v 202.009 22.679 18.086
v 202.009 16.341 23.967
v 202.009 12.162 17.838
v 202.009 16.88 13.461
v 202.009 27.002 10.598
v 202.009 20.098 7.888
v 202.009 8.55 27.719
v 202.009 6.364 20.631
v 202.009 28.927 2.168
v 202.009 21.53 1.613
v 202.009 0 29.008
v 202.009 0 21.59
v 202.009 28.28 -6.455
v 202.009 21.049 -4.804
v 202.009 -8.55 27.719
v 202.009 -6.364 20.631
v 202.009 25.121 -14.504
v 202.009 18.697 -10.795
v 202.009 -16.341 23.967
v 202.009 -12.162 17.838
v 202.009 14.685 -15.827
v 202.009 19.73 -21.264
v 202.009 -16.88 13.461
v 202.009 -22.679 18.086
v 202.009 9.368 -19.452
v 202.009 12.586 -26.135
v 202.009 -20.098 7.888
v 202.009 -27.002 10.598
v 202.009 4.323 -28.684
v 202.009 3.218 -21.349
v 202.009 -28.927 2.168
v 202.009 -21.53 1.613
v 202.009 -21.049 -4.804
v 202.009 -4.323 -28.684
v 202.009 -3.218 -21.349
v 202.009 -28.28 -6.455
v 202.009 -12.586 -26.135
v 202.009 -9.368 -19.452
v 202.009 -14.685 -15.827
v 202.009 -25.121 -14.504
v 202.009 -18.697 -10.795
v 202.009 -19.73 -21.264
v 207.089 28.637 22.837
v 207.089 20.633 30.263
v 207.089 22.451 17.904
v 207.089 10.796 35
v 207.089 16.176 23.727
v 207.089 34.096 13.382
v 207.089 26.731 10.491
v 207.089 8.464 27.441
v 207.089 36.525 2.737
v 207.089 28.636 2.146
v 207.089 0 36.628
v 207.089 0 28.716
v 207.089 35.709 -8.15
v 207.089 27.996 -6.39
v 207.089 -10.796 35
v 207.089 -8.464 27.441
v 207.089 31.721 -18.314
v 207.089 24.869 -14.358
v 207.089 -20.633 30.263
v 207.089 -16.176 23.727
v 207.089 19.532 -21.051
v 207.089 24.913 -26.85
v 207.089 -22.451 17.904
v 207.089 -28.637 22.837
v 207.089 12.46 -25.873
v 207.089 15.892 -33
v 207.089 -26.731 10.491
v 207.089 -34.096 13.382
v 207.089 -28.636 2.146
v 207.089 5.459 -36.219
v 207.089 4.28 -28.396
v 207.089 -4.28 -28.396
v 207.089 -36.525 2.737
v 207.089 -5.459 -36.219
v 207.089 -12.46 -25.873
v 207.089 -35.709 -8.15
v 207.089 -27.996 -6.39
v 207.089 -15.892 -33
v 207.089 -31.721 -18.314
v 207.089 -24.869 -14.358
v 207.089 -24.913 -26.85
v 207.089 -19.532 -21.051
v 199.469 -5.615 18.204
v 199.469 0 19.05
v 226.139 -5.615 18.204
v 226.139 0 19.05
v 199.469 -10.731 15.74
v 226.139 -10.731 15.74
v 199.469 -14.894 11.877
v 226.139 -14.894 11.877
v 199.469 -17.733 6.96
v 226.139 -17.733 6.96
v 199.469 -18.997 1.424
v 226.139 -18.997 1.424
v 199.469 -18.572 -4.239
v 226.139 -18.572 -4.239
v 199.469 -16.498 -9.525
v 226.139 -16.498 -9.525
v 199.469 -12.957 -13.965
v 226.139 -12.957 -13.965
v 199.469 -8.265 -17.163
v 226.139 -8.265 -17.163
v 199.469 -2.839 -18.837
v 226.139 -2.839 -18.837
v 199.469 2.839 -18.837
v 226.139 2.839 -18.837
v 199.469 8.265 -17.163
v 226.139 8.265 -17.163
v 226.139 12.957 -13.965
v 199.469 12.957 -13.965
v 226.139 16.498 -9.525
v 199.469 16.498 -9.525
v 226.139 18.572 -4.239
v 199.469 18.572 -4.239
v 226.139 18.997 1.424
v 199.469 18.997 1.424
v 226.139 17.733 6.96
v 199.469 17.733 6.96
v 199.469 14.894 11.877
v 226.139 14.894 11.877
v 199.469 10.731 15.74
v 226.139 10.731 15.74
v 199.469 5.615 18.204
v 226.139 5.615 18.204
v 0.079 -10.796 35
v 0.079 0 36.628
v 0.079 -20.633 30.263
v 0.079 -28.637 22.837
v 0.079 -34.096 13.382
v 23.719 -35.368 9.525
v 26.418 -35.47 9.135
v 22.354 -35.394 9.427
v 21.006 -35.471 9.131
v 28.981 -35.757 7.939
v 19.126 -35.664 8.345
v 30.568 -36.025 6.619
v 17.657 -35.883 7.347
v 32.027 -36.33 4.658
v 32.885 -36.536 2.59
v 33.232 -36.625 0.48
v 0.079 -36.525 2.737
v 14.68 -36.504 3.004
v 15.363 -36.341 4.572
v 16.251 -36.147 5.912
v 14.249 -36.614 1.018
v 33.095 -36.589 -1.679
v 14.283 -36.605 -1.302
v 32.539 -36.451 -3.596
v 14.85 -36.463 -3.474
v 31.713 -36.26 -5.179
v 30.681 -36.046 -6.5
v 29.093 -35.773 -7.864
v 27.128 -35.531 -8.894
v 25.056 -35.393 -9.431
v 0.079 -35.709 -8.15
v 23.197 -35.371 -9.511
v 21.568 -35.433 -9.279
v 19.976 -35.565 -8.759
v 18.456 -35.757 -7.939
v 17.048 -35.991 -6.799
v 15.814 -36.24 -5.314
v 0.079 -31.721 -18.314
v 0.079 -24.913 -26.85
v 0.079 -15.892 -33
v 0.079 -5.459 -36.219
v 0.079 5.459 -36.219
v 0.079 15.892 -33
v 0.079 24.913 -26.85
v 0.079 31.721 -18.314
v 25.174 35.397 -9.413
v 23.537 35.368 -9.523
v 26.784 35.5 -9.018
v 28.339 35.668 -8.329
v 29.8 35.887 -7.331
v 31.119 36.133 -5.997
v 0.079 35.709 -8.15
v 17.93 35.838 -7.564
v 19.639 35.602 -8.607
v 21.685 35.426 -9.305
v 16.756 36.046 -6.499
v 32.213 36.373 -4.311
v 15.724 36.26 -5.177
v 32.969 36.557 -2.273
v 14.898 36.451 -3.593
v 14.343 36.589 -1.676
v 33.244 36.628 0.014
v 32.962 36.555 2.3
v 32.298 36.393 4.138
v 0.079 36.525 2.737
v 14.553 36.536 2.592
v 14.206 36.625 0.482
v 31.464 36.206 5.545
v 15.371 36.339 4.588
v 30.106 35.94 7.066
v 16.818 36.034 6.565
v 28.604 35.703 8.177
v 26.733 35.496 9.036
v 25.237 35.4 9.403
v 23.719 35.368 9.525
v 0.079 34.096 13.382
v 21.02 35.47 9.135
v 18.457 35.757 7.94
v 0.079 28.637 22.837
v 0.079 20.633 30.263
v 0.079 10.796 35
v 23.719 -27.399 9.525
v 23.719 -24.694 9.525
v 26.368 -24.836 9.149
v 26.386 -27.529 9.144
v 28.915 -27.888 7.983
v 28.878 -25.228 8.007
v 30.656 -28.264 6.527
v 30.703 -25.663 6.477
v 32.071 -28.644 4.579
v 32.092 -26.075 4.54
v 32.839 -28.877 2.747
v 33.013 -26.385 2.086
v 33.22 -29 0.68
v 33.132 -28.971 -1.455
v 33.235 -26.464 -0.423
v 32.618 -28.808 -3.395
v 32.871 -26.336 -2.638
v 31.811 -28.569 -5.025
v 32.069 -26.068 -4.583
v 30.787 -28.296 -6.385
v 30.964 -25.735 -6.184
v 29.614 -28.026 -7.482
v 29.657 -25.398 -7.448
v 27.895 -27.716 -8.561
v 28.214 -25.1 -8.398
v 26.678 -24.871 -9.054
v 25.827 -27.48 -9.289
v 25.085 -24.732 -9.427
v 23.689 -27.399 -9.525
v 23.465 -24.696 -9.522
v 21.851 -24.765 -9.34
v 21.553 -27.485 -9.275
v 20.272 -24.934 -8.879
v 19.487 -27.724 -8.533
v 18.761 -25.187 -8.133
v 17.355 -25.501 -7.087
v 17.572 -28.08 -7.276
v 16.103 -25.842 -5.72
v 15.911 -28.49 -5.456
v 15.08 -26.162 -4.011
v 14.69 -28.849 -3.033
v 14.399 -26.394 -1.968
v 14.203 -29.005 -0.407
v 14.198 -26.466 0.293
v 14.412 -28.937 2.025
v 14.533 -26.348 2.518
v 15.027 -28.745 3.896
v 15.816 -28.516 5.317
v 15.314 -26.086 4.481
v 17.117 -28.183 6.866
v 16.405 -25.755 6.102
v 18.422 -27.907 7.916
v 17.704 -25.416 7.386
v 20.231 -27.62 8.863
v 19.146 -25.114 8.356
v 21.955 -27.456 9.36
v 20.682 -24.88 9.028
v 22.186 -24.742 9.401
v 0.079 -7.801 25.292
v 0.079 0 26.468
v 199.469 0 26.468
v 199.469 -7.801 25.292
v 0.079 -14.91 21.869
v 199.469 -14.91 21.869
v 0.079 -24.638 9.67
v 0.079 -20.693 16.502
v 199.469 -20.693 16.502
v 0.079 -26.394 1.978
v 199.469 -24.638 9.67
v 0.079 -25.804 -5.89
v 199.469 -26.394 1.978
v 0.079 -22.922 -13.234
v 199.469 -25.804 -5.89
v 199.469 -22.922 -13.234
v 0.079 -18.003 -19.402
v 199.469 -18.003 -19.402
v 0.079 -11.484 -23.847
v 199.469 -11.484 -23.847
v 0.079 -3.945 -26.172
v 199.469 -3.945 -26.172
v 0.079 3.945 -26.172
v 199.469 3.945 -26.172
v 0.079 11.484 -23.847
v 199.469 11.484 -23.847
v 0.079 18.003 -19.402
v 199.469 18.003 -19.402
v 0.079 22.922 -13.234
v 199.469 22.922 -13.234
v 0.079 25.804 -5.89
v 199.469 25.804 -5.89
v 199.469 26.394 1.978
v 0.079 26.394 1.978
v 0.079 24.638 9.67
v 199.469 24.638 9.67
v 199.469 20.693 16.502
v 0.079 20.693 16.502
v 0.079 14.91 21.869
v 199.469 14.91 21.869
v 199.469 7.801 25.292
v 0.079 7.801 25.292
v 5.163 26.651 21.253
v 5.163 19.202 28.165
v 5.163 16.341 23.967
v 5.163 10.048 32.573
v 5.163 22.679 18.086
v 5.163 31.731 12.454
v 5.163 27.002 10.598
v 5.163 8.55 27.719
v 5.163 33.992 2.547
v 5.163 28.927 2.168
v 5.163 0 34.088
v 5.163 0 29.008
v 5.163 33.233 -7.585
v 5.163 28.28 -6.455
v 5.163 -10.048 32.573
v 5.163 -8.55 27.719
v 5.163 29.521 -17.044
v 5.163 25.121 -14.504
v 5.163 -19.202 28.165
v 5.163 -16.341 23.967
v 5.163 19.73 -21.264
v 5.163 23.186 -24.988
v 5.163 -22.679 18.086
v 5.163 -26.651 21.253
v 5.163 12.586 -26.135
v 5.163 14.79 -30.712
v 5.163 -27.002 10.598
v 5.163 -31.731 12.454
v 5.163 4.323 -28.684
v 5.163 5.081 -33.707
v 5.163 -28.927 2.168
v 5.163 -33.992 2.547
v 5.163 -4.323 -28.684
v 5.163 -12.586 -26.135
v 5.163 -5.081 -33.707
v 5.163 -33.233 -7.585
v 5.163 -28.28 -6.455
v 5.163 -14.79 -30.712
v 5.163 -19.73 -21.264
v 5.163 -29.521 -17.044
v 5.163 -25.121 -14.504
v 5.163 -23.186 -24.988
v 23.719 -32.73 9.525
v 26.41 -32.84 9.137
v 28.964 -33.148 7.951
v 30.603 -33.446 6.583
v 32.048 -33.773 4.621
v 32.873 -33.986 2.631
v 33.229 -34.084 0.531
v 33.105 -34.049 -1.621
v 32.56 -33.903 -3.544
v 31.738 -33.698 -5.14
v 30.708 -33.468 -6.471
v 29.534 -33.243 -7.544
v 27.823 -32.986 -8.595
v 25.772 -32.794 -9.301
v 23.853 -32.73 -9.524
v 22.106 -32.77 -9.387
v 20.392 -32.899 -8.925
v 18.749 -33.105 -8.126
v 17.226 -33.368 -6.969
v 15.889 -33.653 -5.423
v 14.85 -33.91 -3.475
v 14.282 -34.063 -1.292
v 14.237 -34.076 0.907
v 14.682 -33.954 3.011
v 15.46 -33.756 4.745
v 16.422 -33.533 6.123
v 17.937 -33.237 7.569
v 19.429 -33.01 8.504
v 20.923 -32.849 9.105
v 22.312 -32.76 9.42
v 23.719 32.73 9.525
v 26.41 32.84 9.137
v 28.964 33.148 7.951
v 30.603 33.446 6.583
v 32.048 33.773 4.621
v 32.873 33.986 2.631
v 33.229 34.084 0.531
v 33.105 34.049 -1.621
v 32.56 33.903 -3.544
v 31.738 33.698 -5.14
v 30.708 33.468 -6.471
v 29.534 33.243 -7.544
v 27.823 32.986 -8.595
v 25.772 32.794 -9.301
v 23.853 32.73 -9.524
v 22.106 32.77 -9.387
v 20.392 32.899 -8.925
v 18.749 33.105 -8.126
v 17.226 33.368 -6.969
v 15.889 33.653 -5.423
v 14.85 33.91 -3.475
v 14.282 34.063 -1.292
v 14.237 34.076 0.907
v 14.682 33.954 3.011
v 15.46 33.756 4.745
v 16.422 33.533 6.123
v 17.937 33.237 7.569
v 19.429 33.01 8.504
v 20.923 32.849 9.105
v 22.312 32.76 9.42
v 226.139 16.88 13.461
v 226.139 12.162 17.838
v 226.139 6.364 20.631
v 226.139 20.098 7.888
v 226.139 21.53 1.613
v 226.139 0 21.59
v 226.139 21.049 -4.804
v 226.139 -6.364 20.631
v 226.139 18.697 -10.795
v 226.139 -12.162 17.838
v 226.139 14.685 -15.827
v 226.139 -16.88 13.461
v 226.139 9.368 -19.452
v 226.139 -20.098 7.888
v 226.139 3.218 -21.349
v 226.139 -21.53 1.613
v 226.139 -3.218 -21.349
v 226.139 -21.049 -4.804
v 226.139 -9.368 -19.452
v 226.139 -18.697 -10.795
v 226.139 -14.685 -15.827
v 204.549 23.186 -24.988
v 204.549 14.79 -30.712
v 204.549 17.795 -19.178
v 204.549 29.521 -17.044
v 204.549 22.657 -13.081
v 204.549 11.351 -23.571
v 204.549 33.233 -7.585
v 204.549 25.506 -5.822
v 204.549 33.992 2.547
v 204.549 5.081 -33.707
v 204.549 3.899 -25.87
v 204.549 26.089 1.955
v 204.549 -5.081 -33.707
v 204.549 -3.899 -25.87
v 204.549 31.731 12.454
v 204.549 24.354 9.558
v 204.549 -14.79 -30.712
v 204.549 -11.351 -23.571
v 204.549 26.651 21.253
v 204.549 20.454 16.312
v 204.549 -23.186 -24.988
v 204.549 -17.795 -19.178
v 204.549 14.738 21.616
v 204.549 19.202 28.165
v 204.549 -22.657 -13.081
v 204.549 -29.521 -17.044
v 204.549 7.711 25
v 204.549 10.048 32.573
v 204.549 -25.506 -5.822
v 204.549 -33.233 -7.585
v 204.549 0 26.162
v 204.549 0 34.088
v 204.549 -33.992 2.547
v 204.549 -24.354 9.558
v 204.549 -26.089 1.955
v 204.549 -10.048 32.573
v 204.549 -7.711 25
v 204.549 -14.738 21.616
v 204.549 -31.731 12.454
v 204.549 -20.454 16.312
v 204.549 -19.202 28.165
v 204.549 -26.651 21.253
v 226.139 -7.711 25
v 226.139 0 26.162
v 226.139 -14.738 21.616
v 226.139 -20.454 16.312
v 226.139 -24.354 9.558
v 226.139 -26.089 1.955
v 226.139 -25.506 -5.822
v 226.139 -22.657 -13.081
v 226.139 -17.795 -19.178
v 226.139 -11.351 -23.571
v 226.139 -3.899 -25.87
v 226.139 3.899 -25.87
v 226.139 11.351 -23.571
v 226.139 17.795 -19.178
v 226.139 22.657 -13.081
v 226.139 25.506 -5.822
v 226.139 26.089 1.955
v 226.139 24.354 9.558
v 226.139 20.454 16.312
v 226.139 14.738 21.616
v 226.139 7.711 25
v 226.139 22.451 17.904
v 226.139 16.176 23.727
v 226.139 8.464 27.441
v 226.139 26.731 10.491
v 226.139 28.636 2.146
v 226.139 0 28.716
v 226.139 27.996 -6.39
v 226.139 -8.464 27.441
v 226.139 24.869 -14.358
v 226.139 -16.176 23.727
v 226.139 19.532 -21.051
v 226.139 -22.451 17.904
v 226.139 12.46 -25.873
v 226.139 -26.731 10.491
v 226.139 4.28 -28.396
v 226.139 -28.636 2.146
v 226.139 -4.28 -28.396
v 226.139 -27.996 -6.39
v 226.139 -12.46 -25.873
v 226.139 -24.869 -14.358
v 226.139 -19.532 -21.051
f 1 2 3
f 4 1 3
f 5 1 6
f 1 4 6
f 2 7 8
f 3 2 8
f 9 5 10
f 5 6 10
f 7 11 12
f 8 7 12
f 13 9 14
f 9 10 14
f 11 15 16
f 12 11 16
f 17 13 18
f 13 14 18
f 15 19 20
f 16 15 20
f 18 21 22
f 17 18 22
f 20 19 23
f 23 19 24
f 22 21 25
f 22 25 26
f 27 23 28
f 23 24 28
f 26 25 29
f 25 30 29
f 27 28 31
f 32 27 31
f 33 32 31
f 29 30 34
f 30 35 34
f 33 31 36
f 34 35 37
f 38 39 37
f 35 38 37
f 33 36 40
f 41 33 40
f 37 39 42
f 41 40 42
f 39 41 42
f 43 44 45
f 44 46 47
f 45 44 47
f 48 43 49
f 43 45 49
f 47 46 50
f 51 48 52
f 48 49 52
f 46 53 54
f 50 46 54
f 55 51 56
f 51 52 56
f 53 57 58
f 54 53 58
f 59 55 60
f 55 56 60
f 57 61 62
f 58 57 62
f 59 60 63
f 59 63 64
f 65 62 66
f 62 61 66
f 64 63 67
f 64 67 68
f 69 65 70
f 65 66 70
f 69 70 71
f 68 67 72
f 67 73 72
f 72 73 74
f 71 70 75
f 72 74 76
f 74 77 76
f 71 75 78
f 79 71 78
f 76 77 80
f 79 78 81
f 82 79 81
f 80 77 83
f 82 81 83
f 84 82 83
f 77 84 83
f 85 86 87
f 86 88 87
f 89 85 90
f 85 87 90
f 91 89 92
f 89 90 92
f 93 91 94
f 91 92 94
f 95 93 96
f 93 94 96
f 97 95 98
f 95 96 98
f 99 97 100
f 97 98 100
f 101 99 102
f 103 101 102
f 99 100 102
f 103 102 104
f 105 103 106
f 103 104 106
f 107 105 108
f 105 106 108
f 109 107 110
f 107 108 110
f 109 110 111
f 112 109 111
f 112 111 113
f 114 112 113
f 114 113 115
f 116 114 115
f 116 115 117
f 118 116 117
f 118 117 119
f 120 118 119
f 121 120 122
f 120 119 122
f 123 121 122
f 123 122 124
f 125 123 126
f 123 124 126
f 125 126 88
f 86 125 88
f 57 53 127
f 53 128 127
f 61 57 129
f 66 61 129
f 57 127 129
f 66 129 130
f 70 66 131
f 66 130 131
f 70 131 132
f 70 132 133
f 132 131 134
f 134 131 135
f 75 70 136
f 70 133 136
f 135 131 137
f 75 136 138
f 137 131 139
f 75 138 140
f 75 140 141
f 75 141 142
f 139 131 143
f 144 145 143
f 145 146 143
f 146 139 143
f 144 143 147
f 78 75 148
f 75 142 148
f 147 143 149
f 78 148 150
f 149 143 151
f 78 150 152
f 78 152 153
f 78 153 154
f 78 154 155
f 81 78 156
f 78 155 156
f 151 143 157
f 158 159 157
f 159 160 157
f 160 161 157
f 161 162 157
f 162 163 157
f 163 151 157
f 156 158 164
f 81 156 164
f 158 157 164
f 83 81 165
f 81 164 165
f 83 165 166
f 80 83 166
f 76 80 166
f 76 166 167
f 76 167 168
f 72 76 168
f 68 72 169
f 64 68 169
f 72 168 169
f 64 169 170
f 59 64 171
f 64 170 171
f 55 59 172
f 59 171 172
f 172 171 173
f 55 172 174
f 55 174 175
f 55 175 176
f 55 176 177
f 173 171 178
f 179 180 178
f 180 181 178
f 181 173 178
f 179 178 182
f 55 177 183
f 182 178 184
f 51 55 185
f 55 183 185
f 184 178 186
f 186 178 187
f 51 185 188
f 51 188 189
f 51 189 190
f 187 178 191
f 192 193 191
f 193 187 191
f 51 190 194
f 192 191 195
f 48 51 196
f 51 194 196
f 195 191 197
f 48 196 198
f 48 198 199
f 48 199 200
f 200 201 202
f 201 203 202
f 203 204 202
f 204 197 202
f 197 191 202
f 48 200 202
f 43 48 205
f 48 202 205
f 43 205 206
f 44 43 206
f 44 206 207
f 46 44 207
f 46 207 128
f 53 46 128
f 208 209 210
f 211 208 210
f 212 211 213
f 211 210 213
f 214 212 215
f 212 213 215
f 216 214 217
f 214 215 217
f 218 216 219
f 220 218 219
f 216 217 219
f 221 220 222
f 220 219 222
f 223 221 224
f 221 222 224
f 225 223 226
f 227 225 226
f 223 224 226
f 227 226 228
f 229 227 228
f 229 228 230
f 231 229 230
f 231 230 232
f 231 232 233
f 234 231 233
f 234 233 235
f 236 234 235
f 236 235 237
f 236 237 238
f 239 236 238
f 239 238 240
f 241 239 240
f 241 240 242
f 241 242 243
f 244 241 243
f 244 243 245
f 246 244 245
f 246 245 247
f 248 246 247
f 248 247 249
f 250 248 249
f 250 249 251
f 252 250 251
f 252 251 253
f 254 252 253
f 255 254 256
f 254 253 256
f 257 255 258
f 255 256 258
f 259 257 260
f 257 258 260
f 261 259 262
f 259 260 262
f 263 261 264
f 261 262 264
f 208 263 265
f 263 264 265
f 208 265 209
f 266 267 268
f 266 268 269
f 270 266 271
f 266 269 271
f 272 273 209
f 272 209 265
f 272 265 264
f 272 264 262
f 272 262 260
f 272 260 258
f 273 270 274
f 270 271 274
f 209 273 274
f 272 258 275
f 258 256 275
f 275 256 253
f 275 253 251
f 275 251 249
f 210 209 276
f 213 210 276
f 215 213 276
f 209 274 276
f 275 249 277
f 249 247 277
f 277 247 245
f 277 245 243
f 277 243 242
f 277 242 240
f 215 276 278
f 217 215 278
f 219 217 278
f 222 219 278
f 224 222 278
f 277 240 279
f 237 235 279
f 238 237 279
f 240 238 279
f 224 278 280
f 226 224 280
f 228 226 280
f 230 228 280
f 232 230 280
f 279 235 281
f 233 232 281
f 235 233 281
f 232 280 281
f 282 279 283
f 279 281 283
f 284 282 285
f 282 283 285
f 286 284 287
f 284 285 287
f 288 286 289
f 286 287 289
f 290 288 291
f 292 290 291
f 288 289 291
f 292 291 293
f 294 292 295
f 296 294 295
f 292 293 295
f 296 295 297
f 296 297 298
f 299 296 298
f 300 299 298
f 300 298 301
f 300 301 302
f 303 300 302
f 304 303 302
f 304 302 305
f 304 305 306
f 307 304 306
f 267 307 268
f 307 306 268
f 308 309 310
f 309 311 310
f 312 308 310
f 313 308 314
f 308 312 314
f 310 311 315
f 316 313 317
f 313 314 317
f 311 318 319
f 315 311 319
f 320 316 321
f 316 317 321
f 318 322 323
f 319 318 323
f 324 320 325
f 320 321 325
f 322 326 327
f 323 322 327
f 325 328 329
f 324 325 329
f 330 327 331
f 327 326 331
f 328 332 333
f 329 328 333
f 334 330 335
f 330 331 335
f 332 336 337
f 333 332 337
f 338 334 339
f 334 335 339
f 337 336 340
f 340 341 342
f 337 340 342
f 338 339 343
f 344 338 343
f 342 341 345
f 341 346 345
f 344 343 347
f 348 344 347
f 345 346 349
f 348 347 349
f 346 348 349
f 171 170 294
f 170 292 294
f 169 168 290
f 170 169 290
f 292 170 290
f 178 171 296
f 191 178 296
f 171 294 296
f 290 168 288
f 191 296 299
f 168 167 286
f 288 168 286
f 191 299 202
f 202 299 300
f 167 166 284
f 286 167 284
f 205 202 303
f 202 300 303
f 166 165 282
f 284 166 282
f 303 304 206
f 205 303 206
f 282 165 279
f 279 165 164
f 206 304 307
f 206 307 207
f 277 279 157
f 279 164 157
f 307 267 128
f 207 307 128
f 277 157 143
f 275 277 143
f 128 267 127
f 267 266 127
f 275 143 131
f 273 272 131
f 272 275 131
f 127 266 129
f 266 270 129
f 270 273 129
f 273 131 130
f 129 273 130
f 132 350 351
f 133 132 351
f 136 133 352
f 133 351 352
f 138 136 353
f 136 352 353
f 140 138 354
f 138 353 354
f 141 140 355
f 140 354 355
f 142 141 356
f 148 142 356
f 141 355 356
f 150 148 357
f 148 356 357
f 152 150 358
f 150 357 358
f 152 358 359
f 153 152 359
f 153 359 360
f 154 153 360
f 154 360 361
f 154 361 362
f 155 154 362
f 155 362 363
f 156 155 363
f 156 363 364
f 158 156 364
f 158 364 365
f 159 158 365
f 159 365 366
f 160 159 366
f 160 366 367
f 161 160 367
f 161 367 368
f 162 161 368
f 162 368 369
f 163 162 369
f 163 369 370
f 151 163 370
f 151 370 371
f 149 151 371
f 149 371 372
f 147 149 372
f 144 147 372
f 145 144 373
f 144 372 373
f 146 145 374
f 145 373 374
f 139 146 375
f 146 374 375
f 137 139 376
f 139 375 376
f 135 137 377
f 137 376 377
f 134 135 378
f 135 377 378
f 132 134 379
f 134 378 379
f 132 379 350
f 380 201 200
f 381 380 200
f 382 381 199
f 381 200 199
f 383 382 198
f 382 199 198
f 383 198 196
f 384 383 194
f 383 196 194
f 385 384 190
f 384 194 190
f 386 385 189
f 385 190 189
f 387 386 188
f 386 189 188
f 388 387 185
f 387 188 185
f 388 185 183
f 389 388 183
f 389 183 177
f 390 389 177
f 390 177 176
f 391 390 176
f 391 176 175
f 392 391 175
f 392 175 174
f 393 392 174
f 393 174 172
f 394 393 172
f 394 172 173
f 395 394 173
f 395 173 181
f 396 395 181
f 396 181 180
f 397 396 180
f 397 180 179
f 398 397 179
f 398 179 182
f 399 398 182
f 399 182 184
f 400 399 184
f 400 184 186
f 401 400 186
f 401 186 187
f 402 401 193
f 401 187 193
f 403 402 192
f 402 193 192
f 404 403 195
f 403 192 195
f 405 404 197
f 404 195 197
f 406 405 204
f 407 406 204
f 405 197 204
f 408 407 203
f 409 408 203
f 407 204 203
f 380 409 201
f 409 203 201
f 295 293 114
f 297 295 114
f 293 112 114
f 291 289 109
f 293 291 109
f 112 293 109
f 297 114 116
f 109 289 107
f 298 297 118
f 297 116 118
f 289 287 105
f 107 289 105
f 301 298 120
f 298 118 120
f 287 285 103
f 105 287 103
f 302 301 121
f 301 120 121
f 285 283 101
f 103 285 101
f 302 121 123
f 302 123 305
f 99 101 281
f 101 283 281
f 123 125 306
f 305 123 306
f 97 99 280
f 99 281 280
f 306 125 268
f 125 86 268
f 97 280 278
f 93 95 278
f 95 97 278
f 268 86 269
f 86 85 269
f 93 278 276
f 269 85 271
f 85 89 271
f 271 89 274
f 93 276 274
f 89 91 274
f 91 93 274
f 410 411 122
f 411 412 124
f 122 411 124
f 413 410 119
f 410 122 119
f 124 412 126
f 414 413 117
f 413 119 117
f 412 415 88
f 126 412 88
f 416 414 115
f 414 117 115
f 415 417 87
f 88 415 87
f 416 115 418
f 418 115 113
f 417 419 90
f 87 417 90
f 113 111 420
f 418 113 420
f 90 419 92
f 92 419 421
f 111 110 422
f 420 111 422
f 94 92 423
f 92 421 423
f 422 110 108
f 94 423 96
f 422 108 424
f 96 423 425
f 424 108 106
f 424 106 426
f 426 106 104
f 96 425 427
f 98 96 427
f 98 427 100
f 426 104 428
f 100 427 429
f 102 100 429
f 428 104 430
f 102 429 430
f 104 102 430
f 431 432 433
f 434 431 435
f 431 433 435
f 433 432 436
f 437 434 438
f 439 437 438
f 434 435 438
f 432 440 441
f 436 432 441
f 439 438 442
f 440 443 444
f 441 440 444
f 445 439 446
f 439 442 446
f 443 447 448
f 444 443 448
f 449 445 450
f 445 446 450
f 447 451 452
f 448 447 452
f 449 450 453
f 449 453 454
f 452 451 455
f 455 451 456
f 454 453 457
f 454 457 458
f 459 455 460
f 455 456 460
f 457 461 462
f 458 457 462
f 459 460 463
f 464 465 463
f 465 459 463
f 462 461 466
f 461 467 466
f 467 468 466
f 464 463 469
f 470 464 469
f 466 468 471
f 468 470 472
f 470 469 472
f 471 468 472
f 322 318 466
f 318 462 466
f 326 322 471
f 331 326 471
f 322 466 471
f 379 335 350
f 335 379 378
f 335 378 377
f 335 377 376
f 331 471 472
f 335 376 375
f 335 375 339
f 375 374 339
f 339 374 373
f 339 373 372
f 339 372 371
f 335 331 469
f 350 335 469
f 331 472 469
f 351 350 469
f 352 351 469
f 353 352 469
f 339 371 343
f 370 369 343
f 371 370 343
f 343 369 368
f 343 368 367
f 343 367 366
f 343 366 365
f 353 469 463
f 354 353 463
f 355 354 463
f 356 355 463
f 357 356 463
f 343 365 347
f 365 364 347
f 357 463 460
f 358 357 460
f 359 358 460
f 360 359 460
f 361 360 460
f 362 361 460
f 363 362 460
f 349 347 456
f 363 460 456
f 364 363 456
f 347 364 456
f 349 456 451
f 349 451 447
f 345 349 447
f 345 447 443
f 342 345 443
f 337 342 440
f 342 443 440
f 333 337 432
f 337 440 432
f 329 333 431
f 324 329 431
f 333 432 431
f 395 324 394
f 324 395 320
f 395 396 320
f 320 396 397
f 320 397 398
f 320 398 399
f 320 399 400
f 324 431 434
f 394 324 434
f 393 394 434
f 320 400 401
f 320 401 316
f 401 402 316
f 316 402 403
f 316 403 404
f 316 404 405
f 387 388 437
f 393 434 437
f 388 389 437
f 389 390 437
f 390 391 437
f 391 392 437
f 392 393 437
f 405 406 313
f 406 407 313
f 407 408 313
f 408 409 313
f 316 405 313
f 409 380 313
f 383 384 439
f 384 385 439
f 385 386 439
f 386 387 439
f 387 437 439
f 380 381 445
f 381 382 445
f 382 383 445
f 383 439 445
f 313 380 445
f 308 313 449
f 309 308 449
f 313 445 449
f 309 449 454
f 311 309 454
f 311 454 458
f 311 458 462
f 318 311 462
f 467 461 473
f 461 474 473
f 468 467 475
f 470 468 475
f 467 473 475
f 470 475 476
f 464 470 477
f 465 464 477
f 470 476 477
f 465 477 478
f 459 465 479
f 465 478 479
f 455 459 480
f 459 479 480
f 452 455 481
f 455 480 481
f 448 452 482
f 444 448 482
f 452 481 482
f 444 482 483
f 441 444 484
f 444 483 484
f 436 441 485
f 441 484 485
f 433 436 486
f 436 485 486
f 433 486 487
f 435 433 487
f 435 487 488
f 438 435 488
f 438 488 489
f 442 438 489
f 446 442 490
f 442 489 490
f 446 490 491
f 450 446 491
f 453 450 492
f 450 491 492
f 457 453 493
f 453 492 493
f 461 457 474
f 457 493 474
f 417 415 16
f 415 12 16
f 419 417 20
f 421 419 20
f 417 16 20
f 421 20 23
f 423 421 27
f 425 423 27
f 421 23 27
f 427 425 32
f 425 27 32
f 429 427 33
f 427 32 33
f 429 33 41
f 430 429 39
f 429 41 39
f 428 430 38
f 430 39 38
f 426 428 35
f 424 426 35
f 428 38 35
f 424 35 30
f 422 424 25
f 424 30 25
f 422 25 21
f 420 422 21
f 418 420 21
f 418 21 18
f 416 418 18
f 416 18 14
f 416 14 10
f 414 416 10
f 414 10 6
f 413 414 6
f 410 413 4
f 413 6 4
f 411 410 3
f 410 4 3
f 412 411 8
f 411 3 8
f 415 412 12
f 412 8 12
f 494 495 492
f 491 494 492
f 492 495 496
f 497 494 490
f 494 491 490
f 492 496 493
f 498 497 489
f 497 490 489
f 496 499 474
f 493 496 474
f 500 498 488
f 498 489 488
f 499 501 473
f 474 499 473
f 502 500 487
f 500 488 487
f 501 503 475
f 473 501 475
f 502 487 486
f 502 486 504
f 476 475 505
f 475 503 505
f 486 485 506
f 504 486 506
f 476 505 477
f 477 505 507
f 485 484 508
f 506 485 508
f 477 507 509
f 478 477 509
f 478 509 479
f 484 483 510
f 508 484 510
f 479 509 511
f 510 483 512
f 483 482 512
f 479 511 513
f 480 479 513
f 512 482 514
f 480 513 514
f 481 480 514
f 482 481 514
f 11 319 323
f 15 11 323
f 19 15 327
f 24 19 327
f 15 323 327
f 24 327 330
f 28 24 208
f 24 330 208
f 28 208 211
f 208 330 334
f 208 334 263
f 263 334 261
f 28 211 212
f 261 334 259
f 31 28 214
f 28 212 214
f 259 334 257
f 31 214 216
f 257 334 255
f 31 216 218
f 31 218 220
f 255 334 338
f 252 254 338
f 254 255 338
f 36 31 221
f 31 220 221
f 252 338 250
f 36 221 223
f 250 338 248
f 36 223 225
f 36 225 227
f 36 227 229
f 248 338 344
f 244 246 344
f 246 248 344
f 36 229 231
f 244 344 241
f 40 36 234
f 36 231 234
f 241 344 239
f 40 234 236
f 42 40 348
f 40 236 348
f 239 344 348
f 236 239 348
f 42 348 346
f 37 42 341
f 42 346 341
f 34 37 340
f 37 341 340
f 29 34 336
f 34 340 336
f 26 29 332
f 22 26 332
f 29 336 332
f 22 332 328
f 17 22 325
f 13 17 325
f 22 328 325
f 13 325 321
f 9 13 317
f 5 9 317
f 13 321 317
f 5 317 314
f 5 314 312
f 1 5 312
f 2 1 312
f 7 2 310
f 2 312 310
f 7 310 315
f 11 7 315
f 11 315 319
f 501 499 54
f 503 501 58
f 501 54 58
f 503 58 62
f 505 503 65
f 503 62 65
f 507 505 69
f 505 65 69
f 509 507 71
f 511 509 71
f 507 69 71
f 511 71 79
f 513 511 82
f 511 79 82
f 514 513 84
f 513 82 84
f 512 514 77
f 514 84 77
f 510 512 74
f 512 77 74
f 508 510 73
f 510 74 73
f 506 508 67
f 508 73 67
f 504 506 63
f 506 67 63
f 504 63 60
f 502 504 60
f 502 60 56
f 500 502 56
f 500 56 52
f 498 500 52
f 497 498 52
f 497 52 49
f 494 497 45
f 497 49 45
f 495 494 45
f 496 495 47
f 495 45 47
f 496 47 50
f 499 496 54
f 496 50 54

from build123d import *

# Parameters (mm, degrees)
SKETCH9_R           = 9.525
CUT_EXTRUDE9_DEPTH  = 5.842
CUT_EXTRUDE10_START = 15.24
SKETCH10_R          = 9.525
CUT_EXTRUDE10_DEPTH = 15.24


with BuildPart() as part:
    # Sketch2 → Revolve2 (revolve)
    with BuildSketch(Plane.XY, mode=Mode.PRIVATE) as revolve2_sk:
        Polygon((0.078657589, 36.627682817), (0.078657589, 26.467682817), (19.690604477, 26.467682817), (19.690604477, 29.007682817), (5.162905757, 29.007682817), (5.162905757, 34.087682817), (19.690604477, 34.087682817), (19.690604477, 36.627682817), align=None)
        Polygon((207.088657589, 36.627682817), (19.690604477, 36.627682817), (19.690604477, 34.087682817), (204.548657589, 34.087682817), (204.548657589, 26.162), (226.138657589, 26.162), (226.138657589, 28.71633139), (207.088657589, 28.71633139), align=None)
        Polygon((19.690604477, 29.007682817), (19.690604477, 26.467682817), (199.468657589, 26.467682817), (199.468657589, 19.05), (226.138657589, 19.05), (226.138657589, 21.59), (202.008657589, 21.59), (202.008657589, 29.007682817), (127, 29.007682817), align=None)
    revolve(revolve2_sk.sketch.rotate(Axis((0, 0, 0), (1, 0, 0)), 90), axis=Axis((0, 0, 0), (1, 0, 0)))

    # Sketch9 → Cut-Extrude9 (cut)
    with BuildSketch(Plane(origin=(0, 36.627682817, 0), x_dir=(1, 0, 0), z_dir=(0, 1, 0))):
        with Locations(Location((23.718923994, 0, 0), (0, 0, 270))):
            Circle(SKETCH9_R)
    extrude(amount=-CUT_EXTRUDE9_DEPTH, mode=Mode.SUBTRACT)

    # Sketch10 → Cut-Extrude10 (cut)
    with BuildSketch(Plane(origin=(0, -36.627682817, 0), x_dir=(1, 0, 0), z_dir=(0, 1, 0)).offset(CUT_EXTRUDE10_START)):
        with Locations(Location((23.718923994, 0, 0), (0, 0, 270))):
            Circle(SKETCH10_R)
    extrude(amount=-CUT_EXTRUDE10_DEPTH, mode=Mode.SUBTRACT)


solid = part.part
